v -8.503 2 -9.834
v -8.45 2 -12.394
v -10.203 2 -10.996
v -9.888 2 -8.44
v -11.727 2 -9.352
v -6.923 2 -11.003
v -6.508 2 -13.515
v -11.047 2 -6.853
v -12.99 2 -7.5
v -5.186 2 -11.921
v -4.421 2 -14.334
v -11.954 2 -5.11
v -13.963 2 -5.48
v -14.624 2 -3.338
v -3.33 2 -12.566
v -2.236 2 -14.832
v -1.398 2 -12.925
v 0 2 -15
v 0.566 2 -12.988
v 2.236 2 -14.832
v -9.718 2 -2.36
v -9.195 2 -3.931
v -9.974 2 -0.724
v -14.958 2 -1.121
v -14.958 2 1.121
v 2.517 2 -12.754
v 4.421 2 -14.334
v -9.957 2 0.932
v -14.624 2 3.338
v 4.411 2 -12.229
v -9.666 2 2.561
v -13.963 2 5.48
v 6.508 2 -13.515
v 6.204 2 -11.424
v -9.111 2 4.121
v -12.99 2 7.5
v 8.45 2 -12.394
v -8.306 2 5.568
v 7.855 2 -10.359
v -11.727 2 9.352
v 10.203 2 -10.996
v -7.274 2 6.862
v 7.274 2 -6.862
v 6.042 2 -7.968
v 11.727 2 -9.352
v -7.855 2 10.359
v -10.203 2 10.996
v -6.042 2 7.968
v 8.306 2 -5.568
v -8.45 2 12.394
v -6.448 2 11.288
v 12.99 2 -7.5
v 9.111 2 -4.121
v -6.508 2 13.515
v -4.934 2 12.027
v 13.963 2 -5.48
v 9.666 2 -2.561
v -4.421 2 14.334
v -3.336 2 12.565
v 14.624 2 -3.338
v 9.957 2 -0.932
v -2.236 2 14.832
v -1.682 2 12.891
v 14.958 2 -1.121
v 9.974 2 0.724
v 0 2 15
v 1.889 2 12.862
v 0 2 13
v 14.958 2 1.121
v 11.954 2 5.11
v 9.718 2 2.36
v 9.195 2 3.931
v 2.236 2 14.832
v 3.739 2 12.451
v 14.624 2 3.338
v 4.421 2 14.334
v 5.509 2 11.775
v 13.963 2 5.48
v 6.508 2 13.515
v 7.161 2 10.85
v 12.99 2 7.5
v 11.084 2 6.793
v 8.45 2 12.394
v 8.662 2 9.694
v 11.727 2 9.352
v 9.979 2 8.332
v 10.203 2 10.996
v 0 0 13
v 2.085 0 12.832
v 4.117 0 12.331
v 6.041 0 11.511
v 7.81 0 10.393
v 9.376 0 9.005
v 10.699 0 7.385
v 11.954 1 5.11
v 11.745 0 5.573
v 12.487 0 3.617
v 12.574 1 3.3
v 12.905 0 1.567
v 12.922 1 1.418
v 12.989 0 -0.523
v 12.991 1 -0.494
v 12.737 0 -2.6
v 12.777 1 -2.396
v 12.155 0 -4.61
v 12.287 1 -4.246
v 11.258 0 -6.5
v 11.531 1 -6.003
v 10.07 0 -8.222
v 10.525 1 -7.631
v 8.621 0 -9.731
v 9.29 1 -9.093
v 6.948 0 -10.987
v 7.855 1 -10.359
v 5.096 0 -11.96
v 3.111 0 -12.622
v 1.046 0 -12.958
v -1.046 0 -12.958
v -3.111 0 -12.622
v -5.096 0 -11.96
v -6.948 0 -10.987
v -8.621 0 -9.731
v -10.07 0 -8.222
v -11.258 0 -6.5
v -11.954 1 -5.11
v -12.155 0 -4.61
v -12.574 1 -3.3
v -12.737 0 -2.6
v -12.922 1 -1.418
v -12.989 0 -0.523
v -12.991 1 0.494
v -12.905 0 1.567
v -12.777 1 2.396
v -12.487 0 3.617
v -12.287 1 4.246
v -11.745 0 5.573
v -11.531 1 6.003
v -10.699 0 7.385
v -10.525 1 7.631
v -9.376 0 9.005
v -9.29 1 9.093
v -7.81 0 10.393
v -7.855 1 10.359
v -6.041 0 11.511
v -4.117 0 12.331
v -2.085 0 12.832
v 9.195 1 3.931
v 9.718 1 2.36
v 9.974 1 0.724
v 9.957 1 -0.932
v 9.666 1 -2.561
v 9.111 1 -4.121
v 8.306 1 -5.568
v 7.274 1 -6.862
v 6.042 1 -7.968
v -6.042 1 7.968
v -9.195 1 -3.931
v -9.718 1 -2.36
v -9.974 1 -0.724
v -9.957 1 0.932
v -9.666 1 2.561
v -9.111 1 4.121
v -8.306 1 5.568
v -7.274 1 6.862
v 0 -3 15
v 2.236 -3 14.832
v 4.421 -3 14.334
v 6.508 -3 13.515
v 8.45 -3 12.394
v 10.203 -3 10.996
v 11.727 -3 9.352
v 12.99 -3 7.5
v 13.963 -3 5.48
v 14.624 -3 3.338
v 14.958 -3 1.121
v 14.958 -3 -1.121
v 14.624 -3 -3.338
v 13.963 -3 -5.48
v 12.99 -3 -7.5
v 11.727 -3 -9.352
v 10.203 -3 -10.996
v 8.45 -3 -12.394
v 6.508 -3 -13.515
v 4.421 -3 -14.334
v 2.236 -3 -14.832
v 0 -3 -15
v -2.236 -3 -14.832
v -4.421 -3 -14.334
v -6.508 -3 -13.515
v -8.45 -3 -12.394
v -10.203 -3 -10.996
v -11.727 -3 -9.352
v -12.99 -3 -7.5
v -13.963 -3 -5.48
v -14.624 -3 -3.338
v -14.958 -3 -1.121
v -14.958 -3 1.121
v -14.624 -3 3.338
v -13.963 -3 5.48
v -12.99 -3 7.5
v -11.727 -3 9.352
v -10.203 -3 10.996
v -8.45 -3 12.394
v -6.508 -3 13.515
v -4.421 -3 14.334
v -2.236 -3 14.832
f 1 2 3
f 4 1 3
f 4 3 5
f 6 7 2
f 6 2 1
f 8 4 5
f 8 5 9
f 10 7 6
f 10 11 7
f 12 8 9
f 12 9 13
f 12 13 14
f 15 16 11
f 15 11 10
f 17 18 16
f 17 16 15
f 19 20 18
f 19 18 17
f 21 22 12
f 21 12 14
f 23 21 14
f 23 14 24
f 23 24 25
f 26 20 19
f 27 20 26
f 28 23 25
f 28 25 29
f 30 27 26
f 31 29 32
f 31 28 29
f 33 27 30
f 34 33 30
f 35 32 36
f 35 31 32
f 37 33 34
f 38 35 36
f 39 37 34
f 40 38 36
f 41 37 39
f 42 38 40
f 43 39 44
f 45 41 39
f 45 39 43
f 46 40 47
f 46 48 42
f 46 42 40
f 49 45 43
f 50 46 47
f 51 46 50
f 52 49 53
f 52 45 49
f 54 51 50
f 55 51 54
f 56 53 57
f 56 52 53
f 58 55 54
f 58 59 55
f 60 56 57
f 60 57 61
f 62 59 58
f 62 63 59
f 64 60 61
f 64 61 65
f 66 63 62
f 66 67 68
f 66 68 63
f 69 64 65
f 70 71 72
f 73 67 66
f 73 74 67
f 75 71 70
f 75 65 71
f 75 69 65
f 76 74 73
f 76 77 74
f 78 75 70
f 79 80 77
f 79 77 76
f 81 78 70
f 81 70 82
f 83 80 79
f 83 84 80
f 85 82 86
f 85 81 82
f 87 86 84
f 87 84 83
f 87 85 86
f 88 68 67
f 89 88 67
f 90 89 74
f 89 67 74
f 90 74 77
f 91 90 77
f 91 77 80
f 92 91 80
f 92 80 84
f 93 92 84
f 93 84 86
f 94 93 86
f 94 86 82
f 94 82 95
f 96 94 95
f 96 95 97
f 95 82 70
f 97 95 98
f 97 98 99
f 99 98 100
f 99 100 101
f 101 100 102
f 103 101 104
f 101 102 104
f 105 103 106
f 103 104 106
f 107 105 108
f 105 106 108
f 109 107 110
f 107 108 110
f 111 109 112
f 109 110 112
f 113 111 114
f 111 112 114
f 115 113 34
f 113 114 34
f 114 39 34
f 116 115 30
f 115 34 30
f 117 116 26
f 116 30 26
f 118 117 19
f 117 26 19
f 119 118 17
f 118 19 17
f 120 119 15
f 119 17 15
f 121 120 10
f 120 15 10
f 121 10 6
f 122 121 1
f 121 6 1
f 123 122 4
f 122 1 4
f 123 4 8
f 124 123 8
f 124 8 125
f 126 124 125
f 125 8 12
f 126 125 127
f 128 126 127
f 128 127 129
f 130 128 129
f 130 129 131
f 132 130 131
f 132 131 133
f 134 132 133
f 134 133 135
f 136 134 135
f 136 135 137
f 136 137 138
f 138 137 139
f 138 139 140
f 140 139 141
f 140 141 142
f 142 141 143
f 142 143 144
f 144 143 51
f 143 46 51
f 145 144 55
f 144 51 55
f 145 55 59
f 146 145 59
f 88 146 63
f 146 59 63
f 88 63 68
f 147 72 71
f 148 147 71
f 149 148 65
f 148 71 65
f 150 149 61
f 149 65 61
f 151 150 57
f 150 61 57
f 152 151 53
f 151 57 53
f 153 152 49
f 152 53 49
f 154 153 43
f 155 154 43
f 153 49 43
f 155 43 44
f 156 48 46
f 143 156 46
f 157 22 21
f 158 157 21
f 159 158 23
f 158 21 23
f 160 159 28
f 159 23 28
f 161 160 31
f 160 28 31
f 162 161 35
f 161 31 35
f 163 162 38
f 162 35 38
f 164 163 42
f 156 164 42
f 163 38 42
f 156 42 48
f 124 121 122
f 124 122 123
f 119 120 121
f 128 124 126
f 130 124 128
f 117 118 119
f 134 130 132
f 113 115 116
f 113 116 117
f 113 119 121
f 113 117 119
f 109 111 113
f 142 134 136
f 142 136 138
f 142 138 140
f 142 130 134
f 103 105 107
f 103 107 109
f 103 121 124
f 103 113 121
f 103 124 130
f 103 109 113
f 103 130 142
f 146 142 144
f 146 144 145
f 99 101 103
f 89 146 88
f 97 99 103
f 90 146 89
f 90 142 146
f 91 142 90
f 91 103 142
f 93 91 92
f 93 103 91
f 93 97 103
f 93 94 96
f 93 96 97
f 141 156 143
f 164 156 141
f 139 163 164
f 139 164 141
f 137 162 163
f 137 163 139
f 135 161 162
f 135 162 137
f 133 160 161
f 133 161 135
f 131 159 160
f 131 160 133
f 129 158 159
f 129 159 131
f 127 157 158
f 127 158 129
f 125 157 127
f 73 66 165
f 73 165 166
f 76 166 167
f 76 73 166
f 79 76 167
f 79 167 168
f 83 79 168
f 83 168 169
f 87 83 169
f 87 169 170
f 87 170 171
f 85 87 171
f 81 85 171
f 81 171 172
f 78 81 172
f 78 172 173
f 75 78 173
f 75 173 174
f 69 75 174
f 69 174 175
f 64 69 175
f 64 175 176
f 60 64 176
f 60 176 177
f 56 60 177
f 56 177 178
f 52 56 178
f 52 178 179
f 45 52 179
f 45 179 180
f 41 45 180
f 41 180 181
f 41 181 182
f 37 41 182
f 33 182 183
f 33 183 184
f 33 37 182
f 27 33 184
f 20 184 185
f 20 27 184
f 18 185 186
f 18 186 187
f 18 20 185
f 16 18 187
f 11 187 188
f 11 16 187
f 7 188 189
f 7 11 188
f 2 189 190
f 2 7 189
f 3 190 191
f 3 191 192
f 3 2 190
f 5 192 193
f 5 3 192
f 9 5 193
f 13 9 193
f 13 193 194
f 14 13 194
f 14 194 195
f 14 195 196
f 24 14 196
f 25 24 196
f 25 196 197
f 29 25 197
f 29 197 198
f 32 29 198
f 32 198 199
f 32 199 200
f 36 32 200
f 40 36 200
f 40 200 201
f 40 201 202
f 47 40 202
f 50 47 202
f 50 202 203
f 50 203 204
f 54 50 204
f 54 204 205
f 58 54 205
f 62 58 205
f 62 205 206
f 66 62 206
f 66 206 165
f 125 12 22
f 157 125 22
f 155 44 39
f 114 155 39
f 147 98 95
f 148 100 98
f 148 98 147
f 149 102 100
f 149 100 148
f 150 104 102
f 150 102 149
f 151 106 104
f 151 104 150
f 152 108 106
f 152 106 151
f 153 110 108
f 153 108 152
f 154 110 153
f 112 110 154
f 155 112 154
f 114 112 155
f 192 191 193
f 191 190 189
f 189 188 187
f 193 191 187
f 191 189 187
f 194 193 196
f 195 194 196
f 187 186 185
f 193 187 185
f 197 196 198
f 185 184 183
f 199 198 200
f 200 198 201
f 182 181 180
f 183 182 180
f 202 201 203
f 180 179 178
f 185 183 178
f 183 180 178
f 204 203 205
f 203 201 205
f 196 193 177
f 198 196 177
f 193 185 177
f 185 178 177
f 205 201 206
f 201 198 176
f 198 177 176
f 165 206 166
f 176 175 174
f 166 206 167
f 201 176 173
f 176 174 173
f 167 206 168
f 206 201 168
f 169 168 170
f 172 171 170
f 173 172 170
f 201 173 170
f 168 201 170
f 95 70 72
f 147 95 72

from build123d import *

# Parameters (mm, degrees)
SKIZZE1_R                       = 15
AUFSATZ_LINEAR_AUSTRAGEN1_DEPTH = 3
AUFSATZ_LINEAR_START            = 2
SKIZZE2_R                       = 15
SKIZZE2_R_2                     = 13
AUFSATZ_LINEAR_AUSTRAGEN2_DEPTH = 2
AUFSATZ_LINEAR_AUSTRAGEN3_DEPTH = 1


with BuildPart() as part:
    # Skizze1 → Aufsatz-Linear austragen1 (new body)
    with BuildSketch(Plane(origin=(0, 0, 0), x_dir=(1, 0, 0), z_dir=(0, 1, 0))):
        with Locations(Location((0, 0, 0), (0, 0, 270))):
            Circle(SKIZZE1_R)
    extrude(amount=-AUFSATZ_LINEAR_AUSTRAGEN1_DEPTH)

    # Skizze2 → Aufsatz-Linear austragen2 (add)
    with BuildSketch(Plane(origin=(0, 0, 0), x_dir=(1, 0, 0), z_dir=(0, 1, 0)).offset(AUFSATZ_LINEAR_START)):
        with Locations(Location((0, 0, 0), (0, 0, 270))):
            Circle(SKIZZE2_R)
        with Locations(Location((0, 0, 0), (0, 0, 270))):
            Circle(SKIZZE2_R_2, mode=Mode.SUBTRACT)
    extrude(amount=-AUFSATZ_LINEAR_AUSTRAGEN2_DEPTH)

    # Skizze3 → Aufsatz-Linear austragen3 (add)
    with BuildSketch(Plane(origin=(0, 2, 0), x_dir=(1, 0, 0), z_dir=(0, 1, 0))):
        with BuildLine():
            Line((-6.042078394, -7.968267609), (-7.854701912, -10.358747891))
            ThreePointArc((-7.854701912, -10.358747891), (-12.566291217, -3.329913671), (-11.953670509, 5.109771166))
            Line((-11.953670509, 5.109771166), (-9.195131161, 3.930593205))
            ThreePointArc((-9.195131161, 3.930593205), (-9.666377859, -2.561472055), (-6.042078394, -7.968267609))
        make_face()
        with BuildLine():
            Line((6.042078394, 7.968267609), (7.854701912, 10.358747891))
            ThreePointArc((7.854701912, 10.358747891), (12.566291217, 3.329913671), (11.953670509, -5.109771166))
            Line((11.953670509, -5.109771166), (9.195131161, -3.930593205))
            ThreePointArc((9.195131161, -3.930593205), (9.666377859, 2.561472055), (6.042078394, 7.968267609))
        make_face()
    extrude(amount=-AUFSATZ_LINEAR_AUSTRAGEN3_DEPTH)


solid = part.part
